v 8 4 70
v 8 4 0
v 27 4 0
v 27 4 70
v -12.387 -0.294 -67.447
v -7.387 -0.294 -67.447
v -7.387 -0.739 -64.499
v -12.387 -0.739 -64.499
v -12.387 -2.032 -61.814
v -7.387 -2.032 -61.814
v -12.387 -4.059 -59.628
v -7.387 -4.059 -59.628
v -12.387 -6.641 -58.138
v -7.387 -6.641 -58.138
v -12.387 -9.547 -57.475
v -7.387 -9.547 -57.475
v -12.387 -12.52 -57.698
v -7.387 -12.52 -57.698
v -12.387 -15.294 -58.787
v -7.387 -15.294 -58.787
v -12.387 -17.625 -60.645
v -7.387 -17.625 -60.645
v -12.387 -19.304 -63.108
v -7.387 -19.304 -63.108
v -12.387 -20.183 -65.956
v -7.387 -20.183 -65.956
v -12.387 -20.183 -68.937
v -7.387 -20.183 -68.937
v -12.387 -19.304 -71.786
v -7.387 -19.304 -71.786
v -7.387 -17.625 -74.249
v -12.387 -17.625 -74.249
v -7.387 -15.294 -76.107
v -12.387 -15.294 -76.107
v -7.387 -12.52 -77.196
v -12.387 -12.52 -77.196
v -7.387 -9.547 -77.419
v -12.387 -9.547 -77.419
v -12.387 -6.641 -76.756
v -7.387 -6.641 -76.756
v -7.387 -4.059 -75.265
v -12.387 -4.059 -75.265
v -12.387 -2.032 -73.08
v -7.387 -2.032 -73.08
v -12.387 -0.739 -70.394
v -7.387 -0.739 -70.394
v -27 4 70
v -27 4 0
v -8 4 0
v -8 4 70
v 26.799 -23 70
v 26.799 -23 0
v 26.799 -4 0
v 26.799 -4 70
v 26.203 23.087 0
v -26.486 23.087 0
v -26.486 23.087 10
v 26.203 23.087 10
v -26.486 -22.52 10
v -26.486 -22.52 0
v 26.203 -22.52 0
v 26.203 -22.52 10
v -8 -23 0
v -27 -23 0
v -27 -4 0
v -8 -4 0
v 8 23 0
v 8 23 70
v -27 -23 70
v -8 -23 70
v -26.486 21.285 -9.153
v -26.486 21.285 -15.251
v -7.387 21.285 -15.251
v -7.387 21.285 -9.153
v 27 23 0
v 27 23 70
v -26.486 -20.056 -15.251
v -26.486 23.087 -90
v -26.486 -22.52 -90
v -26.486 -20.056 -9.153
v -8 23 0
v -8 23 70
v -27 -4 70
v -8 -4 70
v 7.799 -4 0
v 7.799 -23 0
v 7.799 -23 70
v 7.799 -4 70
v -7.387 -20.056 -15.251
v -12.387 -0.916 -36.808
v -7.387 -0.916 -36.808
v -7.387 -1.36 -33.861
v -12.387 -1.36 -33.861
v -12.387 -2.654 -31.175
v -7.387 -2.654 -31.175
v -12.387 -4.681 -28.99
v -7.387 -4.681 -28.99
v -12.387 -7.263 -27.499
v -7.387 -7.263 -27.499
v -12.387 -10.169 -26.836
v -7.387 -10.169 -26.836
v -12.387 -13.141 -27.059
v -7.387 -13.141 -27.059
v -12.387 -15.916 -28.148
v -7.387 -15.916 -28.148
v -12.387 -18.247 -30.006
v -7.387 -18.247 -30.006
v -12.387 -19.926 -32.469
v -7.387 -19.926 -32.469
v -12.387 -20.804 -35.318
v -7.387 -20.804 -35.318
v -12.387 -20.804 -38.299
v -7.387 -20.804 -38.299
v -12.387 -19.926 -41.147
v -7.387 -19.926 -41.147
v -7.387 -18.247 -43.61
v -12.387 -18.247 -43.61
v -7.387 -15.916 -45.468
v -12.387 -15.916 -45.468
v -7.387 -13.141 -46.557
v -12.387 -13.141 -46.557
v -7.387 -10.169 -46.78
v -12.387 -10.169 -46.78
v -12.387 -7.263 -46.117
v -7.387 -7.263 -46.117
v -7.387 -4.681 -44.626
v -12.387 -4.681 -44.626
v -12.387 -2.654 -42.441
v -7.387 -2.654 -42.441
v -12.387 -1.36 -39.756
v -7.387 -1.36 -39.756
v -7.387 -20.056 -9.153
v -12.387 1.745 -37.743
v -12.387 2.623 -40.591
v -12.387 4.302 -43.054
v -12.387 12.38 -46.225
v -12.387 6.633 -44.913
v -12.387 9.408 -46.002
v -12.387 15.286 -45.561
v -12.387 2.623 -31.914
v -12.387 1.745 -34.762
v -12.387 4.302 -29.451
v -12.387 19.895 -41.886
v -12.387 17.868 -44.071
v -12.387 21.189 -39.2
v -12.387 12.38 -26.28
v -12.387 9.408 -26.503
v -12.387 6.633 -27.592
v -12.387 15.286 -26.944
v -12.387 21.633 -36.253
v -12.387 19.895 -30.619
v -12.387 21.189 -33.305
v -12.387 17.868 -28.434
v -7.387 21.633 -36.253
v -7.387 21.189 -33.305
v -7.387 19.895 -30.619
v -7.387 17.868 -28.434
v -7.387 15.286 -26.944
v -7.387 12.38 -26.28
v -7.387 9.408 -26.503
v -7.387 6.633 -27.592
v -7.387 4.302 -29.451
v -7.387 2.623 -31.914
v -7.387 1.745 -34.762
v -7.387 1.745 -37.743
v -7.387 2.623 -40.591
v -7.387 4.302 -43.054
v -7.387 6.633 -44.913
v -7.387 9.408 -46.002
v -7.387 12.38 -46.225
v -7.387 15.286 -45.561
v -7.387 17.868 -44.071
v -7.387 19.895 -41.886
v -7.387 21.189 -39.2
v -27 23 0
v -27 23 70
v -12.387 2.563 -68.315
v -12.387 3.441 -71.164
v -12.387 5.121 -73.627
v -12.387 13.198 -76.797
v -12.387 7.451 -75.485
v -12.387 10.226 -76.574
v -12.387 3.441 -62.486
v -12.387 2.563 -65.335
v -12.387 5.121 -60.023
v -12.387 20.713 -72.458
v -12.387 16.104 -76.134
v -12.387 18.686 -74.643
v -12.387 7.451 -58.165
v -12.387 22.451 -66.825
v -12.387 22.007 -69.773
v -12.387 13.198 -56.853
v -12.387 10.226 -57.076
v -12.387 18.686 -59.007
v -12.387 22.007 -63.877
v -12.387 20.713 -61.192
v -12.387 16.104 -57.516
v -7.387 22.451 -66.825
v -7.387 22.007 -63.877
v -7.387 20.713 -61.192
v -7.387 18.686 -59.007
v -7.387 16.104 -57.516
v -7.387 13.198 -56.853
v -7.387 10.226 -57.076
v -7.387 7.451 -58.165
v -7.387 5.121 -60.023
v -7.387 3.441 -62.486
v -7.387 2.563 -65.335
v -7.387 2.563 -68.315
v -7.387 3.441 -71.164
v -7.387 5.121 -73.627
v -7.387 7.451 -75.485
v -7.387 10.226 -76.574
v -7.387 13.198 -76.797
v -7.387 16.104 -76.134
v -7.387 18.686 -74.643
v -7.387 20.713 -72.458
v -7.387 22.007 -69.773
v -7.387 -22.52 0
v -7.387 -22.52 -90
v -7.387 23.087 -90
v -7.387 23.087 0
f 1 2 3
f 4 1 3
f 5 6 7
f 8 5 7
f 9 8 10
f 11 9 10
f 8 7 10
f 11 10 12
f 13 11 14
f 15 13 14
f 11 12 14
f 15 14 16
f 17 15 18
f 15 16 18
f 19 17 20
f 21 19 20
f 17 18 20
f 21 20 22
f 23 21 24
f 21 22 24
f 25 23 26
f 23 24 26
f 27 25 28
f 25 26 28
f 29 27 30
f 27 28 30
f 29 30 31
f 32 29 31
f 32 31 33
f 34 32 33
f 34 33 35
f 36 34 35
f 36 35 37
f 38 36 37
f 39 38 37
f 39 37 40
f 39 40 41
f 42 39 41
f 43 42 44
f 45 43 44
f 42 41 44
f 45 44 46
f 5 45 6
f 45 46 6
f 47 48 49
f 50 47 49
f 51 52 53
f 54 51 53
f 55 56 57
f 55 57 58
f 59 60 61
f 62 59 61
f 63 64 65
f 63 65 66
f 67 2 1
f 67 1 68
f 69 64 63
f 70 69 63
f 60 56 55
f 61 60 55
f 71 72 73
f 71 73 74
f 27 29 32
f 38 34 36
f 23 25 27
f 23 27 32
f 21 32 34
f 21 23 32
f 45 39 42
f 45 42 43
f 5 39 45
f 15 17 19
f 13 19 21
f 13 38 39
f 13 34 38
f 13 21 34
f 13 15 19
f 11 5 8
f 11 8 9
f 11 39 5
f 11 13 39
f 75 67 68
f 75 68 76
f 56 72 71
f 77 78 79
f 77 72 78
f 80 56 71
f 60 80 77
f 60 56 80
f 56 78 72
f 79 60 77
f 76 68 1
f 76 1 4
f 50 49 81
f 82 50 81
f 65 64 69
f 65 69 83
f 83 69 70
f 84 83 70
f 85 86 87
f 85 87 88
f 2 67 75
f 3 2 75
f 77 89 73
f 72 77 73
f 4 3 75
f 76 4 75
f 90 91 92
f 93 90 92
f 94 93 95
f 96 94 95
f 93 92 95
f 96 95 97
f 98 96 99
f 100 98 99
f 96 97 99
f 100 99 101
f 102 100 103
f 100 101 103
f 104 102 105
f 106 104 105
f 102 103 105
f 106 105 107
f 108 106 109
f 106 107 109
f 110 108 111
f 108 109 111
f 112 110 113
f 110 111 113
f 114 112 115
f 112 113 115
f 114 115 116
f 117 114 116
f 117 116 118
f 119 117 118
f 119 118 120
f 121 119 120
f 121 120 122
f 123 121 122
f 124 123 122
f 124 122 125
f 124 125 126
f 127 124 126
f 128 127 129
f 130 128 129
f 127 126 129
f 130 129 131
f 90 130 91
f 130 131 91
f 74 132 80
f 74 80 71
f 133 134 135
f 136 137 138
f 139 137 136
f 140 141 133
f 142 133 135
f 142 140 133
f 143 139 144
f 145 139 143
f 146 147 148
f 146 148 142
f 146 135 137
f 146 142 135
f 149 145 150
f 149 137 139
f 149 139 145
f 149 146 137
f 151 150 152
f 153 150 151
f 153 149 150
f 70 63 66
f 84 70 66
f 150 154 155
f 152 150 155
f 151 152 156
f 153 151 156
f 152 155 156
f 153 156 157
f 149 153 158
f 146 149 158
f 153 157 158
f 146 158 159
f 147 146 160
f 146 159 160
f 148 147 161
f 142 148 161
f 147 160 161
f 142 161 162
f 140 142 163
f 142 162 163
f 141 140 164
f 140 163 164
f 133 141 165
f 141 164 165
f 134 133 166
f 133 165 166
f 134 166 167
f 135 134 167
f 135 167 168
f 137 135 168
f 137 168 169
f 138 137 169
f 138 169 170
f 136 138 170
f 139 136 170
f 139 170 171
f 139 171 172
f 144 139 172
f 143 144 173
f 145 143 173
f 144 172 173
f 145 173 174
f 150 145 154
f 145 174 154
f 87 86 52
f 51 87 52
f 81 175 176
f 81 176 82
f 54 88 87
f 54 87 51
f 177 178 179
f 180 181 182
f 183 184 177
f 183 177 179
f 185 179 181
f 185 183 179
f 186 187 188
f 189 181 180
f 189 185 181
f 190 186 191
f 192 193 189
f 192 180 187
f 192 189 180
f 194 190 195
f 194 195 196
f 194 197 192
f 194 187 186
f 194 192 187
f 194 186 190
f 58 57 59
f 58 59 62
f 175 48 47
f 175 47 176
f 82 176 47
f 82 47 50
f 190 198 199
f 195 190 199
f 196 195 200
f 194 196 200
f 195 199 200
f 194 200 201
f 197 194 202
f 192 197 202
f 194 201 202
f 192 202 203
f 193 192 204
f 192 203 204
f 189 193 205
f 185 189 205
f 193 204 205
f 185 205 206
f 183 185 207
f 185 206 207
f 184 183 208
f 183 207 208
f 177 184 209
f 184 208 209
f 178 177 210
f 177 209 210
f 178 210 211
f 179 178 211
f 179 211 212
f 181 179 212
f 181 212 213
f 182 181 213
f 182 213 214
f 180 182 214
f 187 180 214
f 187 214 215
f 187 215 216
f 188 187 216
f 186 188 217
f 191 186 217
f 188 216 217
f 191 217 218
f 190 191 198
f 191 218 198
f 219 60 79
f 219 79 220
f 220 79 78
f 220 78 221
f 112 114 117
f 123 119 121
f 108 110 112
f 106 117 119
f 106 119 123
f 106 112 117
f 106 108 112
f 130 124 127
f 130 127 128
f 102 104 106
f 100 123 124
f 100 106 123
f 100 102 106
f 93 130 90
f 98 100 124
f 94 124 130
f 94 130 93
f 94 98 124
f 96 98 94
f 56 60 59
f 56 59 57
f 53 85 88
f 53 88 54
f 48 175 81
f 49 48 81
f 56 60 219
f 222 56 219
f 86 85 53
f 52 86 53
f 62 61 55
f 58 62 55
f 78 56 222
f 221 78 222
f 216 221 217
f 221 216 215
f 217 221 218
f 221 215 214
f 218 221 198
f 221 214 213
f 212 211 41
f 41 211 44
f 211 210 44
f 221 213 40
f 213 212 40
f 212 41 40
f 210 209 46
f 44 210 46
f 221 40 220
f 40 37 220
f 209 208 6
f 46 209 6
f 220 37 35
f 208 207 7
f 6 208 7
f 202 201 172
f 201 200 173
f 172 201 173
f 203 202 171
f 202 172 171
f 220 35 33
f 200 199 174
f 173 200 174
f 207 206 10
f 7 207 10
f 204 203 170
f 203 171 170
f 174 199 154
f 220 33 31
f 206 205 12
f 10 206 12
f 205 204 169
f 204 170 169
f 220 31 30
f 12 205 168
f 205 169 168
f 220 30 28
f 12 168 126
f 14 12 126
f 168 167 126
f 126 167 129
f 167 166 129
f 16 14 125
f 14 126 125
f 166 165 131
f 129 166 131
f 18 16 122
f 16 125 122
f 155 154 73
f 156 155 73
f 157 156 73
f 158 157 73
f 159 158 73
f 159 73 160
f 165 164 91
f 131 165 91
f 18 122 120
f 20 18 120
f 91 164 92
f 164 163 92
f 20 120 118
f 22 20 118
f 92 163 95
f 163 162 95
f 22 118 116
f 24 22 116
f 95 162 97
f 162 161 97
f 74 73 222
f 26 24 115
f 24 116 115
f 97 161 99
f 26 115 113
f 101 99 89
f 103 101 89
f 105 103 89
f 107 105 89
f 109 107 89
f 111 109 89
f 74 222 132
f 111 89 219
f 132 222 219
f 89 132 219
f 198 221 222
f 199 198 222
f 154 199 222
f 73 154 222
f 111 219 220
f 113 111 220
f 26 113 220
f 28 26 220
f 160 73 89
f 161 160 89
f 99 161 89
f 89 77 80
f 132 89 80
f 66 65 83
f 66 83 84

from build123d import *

# Parameters (mm, degrees)
F0_W      = 19
F0_H      = 19
F1_DEPTH  = 70
F0_W_2    = 0.3230534494
F0_H_2    = 1.6152560711
F2_W      = 52.6888538152
F2_H      = 45.6070173532
F3_DEPTH  = 10
F4_W      = 19.098944962
F4_H      = 45.6070173532
F5_DEPTH  = 90
F6_R      = 10
F7_DEPTH  = 5
F8_W      = 41.3415543735
F8_H      = 6.098520942
F10_DEPTH = 25


with BuildPart() as f1:
    # F0 (on Top) → F1 (new body)
    with BuildSketch(Plane.XY):
        with Locations((17.5, 13.5)):
            Rectangle(F0_W, F0_H)
    extrude(amount=F1_DEPTH)


with BuildPart() as f1b:
    # F0 (on Top) → F1, piece 2 (new body)
    with BuildSketch(Plane.XY):
        with Locations((17.2985338867, -13.5)):
            Rectangle(F0_W, F0_H)
    extrude(amount=F1_DEPTH)


with BuildPart() as f1c:
    # F0 (on Top) → F1, piece 3 (new body)
    with BuildSketch(Plane.XY):
        with Locations((-17.5, 13.5)):
            Rectangle(F0_W, F0_H)
    extrude(amount=F1_DEPTH)


with BuildPart() as f1d:
    # F0 (on Top) → F1, piece 4 (new body)
    with BuildSketch(Plane.XY):
        with Locations((-57.8844789416, 37.6091524959)):
            Rectangle(F0_W_2, F0_H_2)
    extrude(amount=F1_DEPTH)


with BuildPart() as f1e:
    # F0 (on Top) → F1, piece 5 (new body)
    with BuildSketch(Plane.XY):
        with Locations((-17.5, -13.5)):
            Rectangle(F0_W, F0_H)
    extrude(amount=F1_DEPTH)


with BuildPart() as f3:
    # F2 (on Top) → F3 (new body)
    with BuildSketch(Plane.XY):
        with Locations((-0.1416346058, 0.2832738683)):
            Rectangle(F2_W, F2_H)
    extrude(amount=F3_DEPTH)


with BuildPart() as f5:
    # F4 (on face) → F5 (new body)
    with BuildSketch(Plane(origin=(0, 0, 0), x_dir=(1, 0, 0), z_dir=(0, 0, -1))):
        with Locations((-16.9365890324, -0.2832738683)):
            Rectangle(F4_W, F4_H)
    extrude(amount=F5_DEPTH)

    # F6 (on face) → F7 (cut)
    with BuildSketch(Plane.YZ.offset(-7.3871165514)):
        with Locations((-10.2943791855, -67.4467873472)):
            Circle(F6_R)
        with Locations((11.6329715849, -36.2525216682)):
            Circle(F6_R)
        with Locations((-10.9161689182, -36.8081549947)):
            Circle(F6_R)
        with Locations((12.4510379139, -66.8250028538)):
            Circle(F6_R)
    extrude(amount=-F7_DEPTH, mode=Mode.SUBTRACT)

    # F8 (on face) → F10 (cut)
    with BuildSketch(Plane.YZ.offset(-7.3871165514)):
        with Locations((0.61455369, -12.2019560076)):
            Rectangle(F8_W, F8_H)
    extrude(amount=-F10_DEPTH, mode=Mode.SUBTRACT)


solid = Compound([f1.part, f1b.part, f1c.part, f1e.part, f3.part, f5.part])
